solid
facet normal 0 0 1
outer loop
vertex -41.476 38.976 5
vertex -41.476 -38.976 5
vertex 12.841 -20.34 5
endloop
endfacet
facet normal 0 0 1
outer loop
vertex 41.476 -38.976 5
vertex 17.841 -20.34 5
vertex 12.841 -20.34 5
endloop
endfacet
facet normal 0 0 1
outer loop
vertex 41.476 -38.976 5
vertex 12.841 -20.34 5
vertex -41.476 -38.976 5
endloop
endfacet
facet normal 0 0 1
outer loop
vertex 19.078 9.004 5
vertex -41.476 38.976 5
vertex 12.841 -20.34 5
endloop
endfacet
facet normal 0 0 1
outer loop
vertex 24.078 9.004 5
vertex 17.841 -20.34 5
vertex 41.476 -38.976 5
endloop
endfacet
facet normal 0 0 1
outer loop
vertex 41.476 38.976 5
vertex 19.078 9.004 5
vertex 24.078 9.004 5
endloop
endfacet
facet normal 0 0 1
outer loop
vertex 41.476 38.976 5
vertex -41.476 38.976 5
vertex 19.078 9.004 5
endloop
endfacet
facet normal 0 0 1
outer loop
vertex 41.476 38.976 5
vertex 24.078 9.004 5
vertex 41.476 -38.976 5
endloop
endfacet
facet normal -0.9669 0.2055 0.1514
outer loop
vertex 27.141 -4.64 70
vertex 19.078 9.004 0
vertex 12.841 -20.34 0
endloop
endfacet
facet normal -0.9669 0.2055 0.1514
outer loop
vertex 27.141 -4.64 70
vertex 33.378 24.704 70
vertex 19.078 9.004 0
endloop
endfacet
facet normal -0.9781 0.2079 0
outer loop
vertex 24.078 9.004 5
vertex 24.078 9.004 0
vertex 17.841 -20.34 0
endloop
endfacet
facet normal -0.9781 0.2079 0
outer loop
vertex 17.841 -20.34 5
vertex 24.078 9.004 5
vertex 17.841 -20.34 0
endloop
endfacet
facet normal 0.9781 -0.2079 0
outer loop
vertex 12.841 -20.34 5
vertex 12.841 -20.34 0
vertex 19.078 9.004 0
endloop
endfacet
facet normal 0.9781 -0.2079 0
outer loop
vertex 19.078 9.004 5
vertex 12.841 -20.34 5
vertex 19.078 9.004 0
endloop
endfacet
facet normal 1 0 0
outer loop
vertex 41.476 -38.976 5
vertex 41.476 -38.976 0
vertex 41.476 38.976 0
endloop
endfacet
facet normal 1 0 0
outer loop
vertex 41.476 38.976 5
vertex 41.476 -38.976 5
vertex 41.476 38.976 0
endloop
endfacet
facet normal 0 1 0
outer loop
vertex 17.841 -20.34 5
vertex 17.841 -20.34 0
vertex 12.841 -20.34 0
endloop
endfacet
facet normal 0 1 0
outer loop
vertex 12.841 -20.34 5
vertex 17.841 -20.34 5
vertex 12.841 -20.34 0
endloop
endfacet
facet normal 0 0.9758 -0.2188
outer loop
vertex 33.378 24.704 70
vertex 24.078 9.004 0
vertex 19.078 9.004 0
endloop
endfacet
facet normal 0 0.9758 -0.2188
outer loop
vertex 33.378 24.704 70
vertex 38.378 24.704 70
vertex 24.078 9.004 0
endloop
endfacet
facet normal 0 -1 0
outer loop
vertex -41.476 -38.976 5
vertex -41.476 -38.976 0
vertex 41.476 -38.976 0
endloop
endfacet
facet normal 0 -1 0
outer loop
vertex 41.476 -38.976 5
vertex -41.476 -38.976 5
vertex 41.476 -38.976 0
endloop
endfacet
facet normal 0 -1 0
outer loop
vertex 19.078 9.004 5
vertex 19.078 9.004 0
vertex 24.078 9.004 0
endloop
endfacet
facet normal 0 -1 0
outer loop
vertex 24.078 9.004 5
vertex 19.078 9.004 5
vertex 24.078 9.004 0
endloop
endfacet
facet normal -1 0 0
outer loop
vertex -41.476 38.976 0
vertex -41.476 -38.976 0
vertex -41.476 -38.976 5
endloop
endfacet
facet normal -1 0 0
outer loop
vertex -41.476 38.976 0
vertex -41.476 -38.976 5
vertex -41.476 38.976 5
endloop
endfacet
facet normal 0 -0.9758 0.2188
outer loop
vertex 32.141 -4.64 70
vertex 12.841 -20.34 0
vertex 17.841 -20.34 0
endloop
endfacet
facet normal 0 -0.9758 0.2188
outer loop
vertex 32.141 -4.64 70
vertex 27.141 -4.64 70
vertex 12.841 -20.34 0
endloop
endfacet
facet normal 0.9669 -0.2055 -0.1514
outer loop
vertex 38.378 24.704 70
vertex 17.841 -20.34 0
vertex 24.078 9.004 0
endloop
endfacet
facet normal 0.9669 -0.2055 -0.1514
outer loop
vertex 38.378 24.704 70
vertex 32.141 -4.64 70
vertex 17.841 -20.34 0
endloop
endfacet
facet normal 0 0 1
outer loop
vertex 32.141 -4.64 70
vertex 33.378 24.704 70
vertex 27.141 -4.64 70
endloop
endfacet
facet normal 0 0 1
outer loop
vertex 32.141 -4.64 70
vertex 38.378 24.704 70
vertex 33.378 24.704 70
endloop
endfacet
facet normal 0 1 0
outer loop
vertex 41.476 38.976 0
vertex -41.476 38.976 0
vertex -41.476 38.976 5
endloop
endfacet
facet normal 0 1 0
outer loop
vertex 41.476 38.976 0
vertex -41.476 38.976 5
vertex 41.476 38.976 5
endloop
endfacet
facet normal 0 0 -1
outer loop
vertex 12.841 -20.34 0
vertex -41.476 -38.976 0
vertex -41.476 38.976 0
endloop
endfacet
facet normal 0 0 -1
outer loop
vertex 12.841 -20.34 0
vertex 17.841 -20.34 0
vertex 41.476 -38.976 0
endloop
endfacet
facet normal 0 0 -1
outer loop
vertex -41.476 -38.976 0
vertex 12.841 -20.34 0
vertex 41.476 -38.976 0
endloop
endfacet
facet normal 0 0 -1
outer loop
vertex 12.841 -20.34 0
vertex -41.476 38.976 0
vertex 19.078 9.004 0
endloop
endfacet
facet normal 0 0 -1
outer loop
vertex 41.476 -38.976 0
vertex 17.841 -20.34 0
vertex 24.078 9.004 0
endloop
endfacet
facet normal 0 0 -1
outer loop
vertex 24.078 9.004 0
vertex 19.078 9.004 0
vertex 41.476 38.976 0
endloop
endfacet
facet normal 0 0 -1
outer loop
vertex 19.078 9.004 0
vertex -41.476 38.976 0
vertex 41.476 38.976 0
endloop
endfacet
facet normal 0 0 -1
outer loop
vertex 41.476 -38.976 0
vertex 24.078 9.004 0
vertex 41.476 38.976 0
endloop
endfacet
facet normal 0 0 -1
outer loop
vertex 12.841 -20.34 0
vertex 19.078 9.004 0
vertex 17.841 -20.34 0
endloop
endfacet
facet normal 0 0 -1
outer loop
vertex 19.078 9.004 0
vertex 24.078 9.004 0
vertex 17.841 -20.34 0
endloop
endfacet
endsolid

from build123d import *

# Parameters (mm, degrees)
F0_W     = 82.9521608768
F0_H     = 77.9523070946
F4_DEPTH = 5


with BuildPart() as f3:
    # F0 (on Top) → F3 section 0
    with BuildSketch(Plane.XY):
        Polygon((19.0778917798, 9.0041023762), (12.8405410553, -20.3403256458), (17.8405410553, -20.3403256458), (24.0778917798, 9.0041023762), align=None)
    # F2 (on offset) → F3 section 1
    with BuildSketch(Plane.XY.offset(70)):
        Polygon((38.3778917798, 24.7041023762), (33.3778917798, 24.7041023762), (27.1405410553, -4.6403256458), (32.1405410553, -4.6403256458), align=None)
    loft()


with BuildPart() as f4:
    # F0 (on Top) → F4 (new body)
    with BuildSketch(Plane.XY):
        Rectangle(F0_W, F0_H)
        Polygon((17.8405410553, -20.3403256458), (12.8405410553, -20.3403256458), (19.0778917798, 9.0041023762), (24.0778917798, 9.0041023762), align=None, mode=Mode.SUBTRACT)
    extrude(amount=F4_DEPTH)


solid = Compound([f3.part, f4.part])
